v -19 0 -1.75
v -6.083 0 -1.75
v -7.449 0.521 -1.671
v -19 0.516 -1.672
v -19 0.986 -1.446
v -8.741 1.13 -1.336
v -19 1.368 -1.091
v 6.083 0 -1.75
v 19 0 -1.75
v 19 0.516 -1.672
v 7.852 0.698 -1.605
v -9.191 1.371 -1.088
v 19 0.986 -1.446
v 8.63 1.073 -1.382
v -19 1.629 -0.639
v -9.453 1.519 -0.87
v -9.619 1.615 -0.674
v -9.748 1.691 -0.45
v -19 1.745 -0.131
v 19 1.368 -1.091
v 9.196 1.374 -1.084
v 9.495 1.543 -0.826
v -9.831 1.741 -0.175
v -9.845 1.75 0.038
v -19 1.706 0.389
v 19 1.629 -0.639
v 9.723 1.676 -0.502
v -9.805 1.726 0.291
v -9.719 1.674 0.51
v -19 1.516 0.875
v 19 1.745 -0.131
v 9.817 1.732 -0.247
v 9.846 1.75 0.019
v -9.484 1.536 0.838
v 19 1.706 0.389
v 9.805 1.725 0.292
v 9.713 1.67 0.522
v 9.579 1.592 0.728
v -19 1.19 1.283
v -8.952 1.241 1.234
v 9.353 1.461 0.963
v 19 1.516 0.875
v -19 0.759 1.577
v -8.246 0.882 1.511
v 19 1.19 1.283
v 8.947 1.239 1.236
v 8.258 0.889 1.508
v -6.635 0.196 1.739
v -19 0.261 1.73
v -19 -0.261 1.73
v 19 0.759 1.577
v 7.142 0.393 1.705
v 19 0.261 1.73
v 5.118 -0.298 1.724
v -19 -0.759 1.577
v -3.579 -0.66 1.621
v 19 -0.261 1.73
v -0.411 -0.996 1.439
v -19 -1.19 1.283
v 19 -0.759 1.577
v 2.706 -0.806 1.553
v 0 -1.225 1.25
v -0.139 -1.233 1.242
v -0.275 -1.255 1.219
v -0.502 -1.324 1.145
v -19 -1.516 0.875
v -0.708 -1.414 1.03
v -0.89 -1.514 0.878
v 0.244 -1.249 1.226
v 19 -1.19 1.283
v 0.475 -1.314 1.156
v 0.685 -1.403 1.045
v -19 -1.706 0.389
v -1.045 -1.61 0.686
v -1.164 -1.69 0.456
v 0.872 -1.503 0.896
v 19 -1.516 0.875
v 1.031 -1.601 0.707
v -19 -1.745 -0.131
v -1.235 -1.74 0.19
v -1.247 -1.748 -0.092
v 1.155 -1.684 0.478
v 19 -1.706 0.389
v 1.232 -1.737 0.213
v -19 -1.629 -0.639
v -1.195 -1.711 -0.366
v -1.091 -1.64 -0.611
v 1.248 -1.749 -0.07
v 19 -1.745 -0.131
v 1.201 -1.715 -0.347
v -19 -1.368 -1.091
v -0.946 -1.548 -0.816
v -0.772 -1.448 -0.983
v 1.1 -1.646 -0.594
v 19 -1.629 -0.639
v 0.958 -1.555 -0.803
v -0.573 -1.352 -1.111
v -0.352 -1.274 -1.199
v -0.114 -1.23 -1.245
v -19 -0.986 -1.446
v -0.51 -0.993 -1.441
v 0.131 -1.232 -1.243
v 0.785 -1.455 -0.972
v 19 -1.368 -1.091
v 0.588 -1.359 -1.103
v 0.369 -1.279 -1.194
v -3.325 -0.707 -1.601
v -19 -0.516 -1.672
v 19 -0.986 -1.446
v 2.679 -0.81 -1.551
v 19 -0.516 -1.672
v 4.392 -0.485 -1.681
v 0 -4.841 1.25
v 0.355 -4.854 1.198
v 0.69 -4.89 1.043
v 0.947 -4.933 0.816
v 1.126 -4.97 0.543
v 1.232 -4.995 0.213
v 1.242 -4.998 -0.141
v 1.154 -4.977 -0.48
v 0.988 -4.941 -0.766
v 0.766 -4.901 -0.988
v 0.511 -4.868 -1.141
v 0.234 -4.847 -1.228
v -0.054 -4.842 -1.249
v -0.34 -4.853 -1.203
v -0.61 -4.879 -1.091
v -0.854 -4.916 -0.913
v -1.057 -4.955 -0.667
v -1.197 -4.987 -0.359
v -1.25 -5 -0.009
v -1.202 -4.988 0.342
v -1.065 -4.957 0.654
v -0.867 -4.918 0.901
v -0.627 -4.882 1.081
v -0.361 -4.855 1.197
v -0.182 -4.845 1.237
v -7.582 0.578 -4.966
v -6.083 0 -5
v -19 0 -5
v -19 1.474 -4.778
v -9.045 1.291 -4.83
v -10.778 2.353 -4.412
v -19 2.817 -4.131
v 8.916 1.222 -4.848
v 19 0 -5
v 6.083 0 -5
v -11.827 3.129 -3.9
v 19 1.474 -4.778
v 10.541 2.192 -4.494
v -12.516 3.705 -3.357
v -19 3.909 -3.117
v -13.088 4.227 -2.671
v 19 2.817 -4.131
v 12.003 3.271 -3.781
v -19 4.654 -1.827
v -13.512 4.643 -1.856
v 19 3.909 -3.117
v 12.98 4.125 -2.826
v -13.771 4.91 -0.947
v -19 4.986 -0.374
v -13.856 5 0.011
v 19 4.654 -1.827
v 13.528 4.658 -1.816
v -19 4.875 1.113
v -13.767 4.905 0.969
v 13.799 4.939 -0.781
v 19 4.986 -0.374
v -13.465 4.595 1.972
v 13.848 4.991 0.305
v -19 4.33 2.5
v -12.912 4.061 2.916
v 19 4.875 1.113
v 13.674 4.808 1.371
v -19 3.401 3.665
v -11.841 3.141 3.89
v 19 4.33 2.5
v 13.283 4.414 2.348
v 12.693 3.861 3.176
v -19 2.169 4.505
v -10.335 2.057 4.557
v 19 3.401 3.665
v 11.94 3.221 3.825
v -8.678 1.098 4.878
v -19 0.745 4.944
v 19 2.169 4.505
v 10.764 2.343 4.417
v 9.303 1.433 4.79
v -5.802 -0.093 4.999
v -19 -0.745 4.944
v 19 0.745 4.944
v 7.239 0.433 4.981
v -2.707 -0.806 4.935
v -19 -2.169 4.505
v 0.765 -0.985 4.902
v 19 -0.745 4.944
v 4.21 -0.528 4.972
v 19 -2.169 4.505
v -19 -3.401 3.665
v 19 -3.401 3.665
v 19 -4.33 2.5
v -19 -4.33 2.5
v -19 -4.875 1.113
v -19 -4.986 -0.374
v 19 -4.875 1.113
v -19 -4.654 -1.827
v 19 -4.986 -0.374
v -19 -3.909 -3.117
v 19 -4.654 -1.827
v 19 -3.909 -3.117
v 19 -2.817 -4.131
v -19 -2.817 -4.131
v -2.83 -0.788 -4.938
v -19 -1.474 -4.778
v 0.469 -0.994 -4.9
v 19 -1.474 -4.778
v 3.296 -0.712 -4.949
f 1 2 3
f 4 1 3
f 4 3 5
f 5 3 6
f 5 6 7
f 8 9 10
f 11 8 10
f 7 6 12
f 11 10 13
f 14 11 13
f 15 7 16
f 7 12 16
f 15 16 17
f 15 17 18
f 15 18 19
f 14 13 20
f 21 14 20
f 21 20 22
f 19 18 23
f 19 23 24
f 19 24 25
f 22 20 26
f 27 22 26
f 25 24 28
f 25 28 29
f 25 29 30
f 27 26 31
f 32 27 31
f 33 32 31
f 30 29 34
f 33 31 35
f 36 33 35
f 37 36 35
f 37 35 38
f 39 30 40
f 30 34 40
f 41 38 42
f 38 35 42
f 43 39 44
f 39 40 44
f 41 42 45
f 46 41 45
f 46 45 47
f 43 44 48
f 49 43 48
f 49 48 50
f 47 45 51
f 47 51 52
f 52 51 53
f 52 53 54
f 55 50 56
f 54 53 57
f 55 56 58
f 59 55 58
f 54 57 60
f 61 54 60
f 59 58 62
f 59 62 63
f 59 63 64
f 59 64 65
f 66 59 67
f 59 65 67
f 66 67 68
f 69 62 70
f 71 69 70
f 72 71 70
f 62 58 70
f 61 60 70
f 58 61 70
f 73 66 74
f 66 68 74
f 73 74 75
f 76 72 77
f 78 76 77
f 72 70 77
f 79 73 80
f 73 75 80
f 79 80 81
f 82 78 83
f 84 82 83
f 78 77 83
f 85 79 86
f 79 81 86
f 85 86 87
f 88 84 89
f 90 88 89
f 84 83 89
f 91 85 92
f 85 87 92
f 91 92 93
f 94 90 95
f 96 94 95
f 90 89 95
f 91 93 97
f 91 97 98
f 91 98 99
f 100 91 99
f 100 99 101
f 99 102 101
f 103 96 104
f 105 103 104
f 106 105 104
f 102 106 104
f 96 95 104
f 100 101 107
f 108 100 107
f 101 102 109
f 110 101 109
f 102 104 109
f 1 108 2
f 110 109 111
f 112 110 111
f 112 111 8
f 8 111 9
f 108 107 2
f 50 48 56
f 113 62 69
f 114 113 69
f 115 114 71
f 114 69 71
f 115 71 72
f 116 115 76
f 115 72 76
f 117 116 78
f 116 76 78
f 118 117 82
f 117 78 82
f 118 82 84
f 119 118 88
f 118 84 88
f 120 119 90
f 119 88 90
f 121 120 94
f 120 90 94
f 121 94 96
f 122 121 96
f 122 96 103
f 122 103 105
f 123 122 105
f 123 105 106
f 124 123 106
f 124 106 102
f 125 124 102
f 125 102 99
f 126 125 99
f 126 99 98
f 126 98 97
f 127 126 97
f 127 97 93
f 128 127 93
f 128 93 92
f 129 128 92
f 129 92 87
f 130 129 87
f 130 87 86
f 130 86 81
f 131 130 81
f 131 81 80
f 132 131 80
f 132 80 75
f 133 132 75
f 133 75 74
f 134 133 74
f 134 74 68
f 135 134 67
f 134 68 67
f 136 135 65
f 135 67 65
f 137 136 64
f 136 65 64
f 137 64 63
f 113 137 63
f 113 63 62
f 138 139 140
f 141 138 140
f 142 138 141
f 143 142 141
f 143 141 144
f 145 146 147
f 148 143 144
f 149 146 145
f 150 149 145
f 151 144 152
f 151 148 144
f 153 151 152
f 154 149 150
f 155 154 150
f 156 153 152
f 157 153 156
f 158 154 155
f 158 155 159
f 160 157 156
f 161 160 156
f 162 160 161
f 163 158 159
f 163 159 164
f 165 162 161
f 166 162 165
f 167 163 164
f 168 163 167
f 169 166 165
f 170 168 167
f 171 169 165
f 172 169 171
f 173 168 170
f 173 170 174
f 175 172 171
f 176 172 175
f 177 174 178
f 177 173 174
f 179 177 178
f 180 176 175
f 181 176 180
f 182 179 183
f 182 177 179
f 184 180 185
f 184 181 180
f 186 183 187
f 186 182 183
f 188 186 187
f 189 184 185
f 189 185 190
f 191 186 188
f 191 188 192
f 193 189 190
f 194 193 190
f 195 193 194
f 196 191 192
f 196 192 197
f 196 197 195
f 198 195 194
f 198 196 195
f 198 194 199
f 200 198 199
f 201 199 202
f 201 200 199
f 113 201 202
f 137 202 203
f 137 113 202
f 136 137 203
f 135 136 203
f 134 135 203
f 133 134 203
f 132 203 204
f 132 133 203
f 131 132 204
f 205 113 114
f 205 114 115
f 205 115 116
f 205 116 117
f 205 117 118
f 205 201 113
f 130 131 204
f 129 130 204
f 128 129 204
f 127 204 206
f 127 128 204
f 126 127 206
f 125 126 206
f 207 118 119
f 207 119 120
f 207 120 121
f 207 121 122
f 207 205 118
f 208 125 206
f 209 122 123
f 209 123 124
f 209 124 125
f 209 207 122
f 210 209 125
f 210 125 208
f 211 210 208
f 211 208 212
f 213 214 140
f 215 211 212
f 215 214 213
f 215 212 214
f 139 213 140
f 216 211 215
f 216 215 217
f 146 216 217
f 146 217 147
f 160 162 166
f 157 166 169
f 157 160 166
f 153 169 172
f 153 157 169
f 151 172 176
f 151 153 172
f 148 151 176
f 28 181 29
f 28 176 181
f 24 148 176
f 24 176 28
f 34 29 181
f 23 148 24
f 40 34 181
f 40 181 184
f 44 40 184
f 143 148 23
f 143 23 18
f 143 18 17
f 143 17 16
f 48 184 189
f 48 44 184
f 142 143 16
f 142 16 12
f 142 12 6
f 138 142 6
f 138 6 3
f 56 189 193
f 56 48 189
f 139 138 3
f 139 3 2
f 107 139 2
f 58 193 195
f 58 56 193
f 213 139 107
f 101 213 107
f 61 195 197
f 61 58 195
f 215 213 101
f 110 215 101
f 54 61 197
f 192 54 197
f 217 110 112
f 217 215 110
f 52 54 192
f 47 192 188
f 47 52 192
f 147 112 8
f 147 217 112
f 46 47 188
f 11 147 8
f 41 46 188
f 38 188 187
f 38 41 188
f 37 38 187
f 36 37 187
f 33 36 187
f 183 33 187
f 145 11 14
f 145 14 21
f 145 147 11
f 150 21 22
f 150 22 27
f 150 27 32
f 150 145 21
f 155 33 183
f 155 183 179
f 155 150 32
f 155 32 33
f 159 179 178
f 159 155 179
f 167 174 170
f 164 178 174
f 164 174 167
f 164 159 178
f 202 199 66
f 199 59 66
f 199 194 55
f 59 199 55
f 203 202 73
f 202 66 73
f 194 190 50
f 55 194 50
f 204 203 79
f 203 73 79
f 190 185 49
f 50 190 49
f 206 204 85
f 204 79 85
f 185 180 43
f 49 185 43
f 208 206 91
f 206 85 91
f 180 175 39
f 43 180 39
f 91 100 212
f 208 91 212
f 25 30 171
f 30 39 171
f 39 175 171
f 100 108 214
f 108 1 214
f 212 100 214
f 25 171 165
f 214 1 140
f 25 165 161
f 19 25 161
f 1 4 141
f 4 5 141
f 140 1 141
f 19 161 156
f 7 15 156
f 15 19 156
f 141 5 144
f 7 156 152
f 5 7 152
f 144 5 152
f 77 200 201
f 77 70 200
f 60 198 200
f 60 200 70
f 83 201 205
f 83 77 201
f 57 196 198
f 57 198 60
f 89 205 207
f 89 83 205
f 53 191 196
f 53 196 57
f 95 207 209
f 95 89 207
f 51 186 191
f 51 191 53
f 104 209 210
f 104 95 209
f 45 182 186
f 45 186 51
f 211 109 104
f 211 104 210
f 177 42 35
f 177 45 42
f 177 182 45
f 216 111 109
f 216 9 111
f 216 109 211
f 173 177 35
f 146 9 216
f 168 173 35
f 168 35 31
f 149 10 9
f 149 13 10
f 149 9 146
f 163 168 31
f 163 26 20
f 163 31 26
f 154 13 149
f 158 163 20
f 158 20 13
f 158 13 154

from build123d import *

# Parameters (mm, degrees)
SKETCH1_R               = 5
BOSS_EXTRUDE1_DEPTH     = 19
CUT_EXTRUDE1_DEPTH      = 21.273134933
CUT_EXTRUDE1_DEPTH_BACK = 21.273134933
SKETCH3_R               = 1.75
CUT_EXTRUDE2_DEPTH      = 20
SKETCH4_R               = 1.25
CUT_EXTRUDE3_DEPTH      = 21.273135076


with BuildPart() as part:
    # Sketch1 → Boss-Extrude1 (new, symmetric)
    with BuildSketch(Plane(origin=(0, 0, 0), x_dir=(0, 0, -1), z_dir=(1, 0, 0))):
        Circle(SKETCH1_R)
    extrude(amount=BOSS_EXTRUDE1_DEPTH, both=True)

    # Sketch2 → Cut-Extrude1 (cut, two sides: drawn at the far end of the back side and taken through both)
    with BuildSketch(Plane.XY.offset(-CUT_EXTRUDE1_DEPTH_BACK)):
        with BuildLine():
            Line((-67.696223967, 62.386645779), (-13.856406461, 5))
            ThreePointArc((-13.856406461, 5), (0, -1), (13.856406461, 5))
            Line((13.856406461, 5), (67.696223967, 62.386645779))
            Line((67.696223967, 62.386645779), (67.696223967, 219.764573876))
            Line((67.696223967, 219.764573876), (-67.696223967, 219.764573876))
            Line((-67.696223967, 219.764573876), (-67.696223967, 62.386645779))
        make_face()
    extrude(amount=CUT_EXTRUDE1_DEPTH + CUT_EXTRUDE1_DEPTH_BACK, mode=Mode.SUBTRACT)

    # Sketch3 → Cut-Extrude2 (cut, symmetric)
    with BuildSketch(Plane(origin=(0, 0, 0), x_dir=(0, 0, -1), z_dir=(1, 0, 0))):
        Circle(SKETCH3_R)
    extrude(amount=CUT_EXTRUDE2_DEPTH, both=True, mode=Mode.SUBTRACT)

    # Sketch4 → Cut-Extrude3 (cut, through all)
    with BuildSketch(Plane(origin=(0, 0, 0), x_dir=(1, 0, 0), z_dir=(0, 1, 0))):
        with Locations(Location((0, 0, 0), (0, 0, 270))):
            Circle(SKETCH4_R)
    extrude(amount=-CUT_EXTRUDE3_DEPTH, mode=Mode.SUBTRACT)


solid = part.part
